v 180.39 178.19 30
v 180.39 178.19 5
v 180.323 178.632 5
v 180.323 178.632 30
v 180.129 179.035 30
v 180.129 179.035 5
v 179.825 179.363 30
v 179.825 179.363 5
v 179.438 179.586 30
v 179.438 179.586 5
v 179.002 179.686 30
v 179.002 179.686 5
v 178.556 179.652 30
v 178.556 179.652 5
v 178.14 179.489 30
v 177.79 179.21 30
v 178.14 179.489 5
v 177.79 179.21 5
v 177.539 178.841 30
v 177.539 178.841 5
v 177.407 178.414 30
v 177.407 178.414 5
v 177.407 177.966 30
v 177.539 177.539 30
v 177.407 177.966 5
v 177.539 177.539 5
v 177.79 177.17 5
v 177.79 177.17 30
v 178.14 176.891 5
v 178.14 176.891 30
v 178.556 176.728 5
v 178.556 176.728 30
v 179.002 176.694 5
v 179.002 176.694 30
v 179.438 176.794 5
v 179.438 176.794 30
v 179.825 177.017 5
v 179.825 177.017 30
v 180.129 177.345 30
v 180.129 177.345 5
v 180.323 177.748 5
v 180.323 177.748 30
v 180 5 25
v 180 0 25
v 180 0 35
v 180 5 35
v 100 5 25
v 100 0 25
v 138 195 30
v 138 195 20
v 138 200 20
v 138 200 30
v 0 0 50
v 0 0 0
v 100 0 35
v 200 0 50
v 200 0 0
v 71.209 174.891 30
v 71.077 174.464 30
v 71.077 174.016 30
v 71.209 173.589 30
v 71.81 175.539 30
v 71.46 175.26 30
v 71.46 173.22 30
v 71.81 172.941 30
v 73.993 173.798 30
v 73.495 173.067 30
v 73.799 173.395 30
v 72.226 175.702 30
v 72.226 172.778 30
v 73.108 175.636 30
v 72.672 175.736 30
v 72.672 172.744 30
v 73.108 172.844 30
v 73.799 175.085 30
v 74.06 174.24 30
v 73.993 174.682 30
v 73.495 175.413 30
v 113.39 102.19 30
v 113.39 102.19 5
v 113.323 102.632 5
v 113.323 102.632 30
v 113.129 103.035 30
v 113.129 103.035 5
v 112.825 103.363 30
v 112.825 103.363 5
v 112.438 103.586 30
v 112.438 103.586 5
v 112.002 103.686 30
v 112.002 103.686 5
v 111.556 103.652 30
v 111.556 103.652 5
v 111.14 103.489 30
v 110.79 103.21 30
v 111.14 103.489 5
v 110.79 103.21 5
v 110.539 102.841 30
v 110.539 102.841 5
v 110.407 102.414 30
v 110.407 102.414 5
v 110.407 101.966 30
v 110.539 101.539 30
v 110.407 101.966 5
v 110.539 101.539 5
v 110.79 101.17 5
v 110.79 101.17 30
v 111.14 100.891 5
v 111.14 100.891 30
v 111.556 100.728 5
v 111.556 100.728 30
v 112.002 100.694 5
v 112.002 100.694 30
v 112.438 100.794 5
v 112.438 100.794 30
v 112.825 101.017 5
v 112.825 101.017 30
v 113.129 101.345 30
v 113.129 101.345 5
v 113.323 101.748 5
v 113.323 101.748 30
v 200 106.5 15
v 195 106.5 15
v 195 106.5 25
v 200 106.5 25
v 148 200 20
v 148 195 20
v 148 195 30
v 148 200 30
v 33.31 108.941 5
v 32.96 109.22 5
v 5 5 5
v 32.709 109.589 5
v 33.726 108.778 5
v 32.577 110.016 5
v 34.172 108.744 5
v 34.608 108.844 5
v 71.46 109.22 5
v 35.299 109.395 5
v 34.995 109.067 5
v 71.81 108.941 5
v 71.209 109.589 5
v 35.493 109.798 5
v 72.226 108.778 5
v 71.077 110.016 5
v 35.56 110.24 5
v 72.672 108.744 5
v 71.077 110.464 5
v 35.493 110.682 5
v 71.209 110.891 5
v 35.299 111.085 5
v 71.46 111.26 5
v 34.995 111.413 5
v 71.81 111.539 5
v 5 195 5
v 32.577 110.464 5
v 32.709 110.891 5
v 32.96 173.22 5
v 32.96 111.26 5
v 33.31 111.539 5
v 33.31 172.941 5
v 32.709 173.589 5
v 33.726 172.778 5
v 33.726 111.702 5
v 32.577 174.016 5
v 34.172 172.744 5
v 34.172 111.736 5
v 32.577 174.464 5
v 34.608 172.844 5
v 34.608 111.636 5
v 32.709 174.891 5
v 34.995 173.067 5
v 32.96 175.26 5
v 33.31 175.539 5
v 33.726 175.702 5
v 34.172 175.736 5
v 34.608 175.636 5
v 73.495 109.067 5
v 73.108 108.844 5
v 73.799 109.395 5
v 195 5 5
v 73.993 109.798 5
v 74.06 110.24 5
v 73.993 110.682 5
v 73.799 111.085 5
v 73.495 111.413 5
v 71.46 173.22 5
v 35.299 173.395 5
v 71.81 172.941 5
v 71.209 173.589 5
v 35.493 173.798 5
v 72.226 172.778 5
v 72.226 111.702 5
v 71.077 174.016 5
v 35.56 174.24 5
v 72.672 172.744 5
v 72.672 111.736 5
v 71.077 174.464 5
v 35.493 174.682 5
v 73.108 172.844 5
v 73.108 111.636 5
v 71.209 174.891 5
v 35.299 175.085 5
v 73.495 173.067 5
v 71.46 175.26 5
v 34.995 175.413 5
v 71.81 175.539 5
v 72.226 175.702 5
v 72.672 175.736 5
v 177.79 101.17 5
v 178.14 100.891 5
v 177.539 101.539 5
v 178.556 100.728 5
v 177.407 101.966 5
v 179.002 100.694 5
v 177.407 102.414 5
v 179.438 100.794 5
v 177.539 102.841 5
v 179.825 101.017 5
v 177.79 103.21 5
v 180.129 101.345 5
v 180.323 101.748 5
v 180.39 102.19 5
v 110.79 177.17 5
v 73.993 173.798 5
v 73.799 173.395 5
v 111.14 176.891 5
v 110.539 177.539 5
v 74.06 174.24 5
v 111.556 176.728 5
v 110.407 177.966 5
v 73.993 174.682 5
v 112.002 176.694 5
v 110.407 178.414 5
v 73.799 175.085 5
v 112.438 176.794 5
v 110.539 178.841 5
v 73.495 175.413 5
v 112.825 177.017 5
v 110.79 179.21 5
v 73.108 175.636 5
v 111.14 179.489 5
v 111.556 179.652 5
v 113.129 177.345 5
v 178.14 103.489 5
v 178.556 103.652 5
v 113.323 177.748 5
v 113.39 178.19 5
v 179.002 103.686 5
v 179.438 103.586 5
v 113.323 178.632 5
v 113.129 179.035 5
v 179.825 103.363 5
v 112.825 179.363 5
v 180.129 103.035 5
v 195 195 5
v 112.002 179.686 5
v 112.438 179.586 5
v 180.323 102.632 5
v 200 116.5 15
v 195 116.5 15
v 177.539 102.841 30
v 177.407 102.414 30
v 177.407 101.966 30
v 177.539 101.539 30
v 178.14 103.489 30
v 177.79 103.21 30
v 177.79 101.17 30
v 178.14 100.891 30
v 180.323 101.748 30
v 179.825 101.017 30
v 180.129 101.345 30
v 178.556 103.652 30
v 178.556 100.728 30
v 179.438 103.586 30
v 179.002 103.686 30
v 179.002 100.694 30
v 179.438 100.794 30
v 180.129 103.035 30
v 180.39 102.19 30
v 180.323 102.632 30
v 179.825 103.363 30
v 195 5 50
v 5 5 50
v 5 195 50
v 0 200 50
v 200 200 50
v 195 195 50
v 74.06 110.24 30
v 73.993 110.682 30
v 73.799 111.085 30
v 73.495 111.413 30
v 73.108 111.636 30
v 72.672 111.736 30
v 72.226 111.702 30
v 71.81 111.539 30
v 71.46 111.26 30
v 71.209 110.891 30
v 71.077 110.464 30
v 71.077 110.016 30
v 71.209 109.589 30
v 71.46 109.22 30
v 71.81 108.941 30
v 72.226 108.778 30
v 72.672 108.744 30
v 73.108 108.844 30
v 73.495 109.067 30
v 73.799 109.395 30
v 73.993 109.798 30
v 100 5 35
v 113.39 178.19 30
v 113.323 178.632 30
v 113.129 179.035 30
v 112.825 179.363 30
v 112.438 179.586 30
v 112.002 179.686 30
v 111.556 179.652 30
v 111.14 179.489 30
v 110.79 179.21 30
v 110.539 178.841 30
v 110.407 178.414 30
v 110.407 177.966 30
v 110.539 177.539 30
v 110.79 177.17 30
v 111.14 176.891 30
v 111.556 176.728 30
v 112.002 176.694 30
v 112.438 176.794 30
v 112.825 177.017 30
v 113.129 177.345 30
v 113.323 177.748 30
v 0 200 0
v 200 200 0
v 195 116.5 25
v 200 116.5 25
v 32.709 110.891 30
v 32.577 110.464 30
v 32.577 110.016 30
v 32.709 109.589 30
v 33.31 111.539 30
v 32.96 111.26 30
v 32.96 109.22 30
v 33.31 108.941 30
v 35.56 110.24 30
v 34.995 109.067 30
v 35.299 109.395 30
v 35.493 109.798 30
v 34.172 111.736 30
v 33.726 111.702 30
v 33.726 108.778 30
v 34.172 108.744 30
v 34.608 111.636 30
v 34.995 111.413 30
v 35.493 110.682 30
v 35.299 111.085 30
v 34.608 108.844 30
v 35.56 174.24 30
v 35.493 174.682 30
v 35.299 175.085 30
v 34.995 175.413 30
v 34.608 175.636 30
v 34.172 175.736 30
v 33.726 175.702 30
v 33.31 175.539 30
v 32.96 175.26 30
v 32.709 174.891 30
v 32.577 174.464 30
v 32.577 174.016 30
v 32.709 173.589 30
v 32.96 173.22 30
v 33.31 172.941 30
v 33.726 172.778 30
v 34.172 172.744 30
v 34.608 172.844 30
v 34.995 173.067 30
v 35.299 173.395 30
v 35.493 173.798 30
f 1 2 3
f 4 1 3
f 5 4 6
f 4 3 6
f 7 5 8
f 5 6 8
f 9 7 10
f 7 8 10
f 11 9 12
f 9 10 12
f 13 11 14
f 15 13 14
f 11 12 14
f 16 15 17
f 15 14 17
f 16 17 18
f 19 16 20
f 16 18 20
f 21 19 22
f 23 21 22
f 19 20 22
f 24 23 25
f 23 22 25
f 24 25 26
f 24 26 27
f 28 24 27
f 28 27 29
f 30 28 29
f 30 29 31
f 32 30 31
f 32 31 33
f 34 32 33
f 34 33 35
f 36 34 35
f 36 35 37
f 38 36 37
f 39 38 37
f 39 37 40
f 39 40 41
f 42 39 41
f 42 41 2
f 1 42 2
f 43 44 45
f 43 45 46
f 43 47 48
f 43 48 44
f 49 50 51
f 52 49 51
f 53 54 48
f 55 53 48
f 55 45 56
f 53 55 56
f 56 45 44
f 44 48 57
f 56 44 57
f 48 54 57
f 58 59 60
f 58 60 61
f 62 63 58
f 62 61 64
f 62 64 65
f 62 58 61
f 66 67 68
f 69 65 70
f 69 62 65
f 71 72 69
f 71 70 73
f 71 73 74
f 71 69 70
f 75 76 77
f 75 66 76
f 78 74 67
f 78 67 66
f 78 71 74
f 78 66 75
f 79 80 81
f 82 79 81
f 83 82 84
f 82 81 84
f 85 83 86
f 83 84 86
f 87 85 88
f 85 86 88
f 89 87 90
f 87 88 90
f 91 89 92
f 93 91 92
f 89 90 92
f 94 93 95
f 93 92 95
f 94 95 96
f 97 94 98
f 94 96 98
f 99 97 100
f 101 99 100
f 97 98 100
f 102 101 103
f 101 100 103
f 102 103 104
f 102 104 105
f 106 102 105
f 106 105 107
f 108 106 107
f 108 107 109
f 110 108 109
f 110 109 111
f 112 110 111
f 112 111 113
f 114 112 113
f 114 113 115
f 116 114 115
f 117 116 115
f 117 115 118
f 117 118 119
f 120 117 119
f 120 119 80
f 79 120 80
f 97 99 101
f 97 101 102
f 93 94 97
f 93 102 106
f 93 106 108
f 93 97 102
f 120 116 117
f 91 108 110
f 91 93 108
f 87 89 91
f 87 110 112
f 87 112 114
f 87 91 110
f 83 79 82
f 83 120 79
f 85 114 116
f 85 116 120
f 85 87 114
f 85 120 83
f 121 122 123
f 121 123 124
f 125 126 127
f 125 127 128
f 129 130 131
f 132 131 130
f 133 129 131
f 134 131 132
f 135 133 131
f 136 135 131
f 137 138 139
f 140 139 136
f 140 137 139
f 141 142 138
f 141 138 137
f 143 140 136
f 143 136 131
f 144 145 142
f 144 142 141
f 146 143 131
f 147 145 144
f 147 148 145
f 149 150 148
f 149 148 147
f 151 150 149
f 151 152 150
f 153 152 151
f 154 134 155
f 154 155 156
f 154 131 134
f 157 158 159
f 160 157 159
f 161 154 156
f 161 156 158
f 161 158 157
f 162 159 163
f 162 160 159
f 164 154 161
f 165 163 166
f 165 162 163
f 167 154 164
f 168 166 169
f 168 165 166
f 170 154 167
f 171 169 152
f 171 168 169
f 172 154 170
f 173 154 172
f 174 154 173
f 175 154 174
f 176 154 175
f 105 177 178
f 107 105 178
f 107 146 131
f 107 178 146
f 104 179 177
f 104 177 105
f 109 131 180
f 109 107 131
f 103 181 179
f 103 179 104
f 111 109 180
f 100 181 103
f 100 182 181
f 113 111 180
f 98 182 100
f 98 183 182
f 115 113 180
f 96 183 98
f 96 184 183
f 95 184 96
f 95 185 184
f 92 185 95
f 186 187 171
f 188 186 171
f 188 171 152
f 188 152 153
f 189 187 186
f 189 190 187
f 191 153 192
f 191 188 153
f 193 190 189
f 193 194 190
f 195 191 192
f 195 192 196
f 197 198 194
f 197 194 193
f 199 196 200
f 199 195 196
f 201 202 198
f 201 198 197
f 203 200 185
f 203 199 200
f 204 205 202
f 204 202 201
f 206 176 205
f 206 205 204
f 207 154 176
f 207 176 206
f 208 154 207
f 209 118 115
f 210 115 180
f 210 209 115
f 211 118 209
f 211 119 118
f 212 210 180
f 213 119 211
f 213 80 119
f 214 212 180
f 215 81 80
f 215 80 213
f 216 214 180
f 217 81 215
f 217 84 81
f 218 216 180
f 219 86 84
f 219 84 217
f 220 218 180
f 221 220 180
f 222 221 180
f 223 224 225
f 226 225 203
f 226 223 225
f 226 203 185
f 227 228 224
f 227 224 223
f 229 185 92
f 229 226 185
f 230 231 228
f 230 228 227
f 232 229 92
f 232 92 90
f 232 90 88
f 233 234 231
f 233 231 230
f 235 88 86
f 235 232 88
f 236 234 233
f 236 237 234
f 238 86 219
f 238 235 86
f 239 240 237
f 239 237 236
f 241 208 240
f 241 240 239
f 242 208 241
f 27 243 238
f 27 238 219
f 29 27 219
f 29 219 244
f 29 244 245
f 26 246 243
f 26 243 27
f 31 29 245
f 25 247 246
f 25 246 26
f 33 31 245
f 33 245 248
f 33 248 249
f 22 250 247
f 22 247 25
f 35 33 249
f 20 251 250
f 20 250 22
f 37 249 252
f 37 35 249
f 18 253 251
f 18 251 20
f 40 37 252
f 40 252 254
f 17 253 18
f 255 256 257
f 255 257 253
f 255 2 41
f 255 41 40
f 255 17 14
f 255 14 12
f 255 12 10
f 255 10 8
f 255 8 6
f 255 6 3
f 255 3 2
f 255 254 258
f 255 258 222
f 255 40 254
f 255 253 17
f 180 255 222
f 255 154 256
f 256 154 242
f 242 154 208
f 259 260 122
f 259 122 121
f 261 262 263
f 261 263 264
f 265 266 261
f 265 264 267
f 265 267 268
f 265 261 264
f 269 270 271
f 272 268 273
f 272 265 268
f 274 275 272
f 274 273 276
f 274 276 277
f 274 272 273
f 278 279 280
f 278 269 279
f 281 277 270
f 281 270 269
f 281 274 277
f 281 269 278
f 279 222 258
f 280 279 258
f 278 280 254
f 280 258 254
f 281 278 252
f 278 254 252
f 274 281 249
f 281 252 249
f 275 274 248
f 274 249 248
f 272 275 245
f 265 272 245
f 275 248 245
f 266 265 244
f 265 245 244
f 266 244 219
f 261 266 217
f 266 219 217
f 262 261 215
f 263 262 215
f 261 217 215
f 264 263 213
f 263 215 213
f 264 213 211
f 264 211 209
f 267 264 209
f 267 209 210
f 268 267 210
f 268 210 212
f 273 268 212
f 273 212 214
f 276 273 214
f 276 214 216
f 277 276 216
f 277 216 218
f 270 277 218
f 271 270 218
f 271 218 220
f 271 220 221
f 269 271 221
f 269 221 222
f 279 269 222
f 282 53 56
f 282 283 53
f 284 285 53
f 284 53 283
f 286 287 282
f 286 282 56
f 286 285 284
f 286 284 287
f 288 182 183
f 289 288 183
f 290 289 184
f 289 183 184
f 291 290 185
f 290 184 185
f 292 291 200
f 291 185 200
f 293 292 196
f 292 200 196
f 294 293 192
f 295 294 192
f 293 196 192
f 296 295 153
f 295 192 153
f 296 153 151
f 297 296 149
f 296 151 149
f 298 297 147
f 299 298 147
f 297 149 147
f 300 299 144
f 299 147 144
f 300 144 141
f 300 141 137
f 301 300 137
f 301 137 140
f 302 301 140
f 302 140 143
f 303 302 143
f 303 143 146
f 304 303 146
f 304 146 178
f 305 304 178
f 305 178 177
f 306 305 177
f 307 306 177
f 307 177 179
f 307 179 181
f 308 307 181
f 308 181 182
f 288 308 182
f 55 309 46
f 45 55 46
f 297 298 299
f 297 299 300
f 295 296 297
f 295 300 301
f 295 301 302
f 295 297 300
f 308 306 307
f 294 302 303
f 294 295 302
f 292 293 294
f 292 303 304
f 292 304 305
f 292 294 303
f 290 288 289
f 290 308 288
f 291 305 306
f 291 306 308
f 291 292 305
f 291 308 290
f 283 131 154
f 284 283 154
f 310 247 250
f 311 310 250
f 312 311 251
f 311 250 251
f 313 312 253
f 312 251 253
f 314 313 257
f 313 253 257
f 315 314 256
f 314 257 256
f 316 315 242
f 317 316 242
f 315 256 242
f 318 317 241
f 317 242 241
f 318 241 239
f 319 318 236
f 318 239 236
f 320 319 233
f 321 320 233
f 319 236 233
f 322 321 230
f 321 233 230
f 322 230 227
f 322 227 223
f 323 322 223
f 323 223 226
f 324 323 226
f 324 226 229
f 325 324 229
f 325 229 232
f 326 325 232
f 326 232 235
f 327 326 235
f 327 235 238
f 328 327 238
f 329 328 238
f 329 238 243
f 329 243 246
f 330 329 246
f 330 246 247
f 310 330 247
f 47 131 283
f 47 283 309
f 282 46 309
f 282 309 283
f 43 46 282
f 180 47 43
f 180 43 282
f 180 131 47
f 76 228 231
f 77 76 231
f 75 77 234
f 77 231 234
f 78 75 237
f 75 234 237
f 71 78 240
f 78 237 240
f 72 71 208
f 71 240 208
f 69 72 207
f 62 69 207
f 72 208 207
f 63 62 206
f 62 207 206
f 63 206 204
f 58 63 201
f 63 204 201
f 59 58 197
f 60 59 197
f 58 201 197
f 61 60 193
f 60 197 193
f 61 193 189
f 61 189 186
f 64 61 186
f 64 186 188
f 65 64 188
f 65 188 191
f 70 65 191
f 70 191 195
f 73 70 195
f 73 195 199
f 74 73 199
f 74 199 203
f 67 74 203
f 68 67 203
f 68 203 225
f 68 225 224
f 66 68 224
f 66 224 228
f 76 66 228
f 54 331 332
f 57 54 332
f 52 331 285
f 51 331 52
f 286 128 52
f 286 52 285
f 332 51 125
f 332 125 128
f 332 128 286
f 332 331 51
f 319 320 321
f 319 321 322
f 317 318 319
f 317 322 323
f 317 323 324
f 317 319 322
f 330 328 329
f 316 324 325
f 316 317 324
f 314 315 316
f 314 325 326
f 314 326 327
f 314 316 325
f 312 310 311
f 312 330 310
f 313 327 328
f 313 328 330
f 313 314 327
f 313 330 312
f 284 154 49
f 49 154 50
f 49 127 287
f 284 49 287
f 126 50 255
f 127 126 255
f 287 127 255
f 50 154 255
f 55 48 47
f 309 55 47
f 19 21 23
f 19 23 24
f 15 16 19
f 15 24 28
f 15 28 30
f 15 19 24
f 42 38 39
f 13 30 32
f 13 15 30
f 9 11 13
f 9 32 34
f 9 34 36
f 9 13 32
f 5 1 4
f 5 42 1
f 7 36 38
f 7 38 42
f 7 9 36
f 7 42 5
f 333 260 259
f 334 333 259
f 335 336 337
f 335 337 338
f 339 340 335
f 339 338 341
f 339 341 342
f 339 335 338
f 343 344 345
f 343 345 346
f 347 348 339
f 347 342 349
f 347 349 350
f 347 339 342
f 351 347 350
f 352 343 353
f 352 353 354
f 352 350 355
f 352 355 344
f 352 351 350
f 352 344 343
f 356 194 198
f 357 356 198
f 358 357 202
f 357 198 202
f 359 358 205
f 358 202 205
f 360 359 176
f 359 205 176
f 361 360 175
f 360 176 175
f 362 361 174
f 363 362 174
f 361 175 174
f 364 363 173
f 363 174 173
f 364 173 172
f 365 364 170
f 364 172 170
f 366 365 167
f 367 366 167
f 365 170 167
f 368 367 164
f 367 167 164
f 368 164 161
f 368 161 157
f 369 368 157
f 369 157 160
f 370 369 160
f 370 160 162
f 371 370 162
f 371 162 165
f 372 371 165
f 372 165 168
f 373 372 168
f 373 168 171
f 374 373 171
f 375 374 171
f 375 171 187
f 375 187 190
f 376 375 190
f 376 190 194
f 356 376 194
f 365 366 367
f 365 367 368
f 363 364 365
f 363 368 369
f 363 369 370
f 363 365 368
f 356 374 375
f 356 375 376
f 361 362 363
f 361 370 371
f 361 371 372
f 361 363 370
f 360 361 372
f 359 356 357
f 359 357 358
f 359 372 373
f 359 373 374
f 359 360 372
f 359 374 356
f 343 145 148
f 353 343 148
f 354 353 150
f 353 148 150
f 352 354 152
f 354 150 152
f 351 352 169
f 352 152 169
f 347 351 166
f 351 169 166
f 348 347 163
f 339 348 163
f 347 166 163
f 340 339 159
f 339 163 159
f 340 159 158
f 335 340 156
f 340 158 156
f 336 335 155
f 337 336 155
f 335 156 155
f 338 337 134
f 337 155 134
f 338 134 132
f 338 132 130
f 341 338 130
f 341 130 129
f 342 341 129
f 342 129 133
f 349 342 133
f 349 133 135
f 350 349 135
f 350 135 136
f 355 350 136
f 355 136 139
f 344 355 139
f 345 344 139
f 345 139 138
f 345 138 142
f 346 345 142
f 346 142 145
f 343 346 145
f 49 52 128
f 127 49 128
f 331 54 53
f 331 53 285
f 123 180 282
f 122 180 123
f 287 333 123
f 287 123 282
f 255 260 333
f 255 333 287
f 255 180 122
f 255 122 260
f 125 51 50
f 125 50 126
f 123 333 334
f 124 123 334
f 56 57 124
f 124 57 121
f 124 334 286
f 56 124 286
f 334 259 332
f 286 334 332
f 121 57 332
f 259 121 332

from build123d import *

# Parameters (mm, degrees)
CYLINDER007_R     = 1.5
CYLINDER007_DEPTH = 30
CYLINDER006_R     = 1.5
CYLINDER006_DEPTH = 30
CYLINDER005_R     = 1.5
CYLINDER005_DEPTH = 30
CYLINDER004_R     = 1.5
CYLINDER004_DEPTH = 30
CYLINDER003_R     = 1.5
CYLINDER003_DEPTH = 30
CYLINDER002_R     = 1.5
CYLINDER002_DEPTH = 30
CYLINDER001_R     = 1.5
CYLINDER001_DEPTH = 30
CYLINDER_R        = 1.5
CYLINDER_DEPTH    = 30
BOX003_W          = 10
BOX003_H          = 10
BOX003_DEPTH      = 10
BOX004_W          = 80
BOX004_H          = 10
BOX004_DEPTH      = 10
BOX002_W          = 10
BOX002_H          = 10
BOX002_DEPTH      = 10
BOX001_W          = 190
BOX001_H          = 190
BOX001_DEPTH      = 45
BOX_W             = 200
BOX_H             = 200
BOX_DEPTH         = 50


with BuildPart() as cylinder007:
    # Cylinder007 → Cylinder007 (new body)
    with BuildSketch(Plane(origin=(34.06, 110.24, 0), x_dir=(1, 0, 0), z_dir=(0, 0, 1))):
        Circle(CYLINDER007_R)
    extrude(amount=CYLINDER007_DEPTH)


with BuildPart() as cylinder006:
    # Cylinder006 → Cylinder006 (new body)
    with BuildSketch(Plane(origin=(34.06, 174.24, 0), x_dir=(1, 0, 0), z_dir=(0, 0, 1))):
        Circle(CYLINDER006_R)
    extrude(amount=CYLINDER006_DEPTH)


with BuildPart() as cylinder005:
    # Cylinder005 → Cylinder005 (new body)
    with BuildSketch(Plane(origin=(72.56, 174.24, 0), x_dir=(1, 0, 0), z_dir=(0, 0, 1))):
        Circle(CYLINDER005_R)
    extrude(amount=CYLINDER005_DEPTH)


with BuildPart() as cylinder004:
    # Cylinder004 → Cylinder004 (new body)
    with BuildSketch(Plane(origin=(72.56, 110.24, 0), x_dir=(1, 0, 0), z_dir=(0, 0, 1))):
        Circle(CYLINDER004_R)
    extrude(amount=CYLINDER004_DEPTH)


with BuildPart() as cylinder003:
    # Cylinder003 → Cylinder003 (new body)
    with BuildSketch(Plane(origin=(178.89, 102.19, 0), x_dir=(1, 0, 0), z_dir=(0, 0, 1))):
        Circle(CYLINDER003_R)
    extrude(amount=CYLINDER003_DEPTH)


with BuildPart() as cylinder002:
    # Cylinder002 → Cylinder002 (new body)
    with BuildSketch(Plane(origin=(178.89, 178.19, 0), x_dir=(1, 0, 0), z_dir=(0, 0, 1))):
        Circle(CYLINDER002_R)
    extrude(amount=CYLINDER002_DEPTH)


with BuildPart() as cylinder001:
    # Cylinder001 → Cylinder001 (new body)
    with BuildSketch(Plane(origin=(111.89, 178.19, 0), x_dir=(1, 0, 0), z_dir=(0, 0, 1))):
        Circle(CYLINDER001_R)
    extrude(amount=CYLINDER001_DEPTH)


with BuildPart() as cylinder:
    # Cylinder → Cylinder (new body)
    with BuildSketch(Plane(origin=(111.89, 102.19, 0), x_dir=(1, 0, 0), z_dir=(0, 0, 1))):
        Circle(CYLINDER_R)
    extrude(amount=CYLINDER_DEPTH)


with BuildPart() as cube003:
    # Box003 → Box003 (new body)
    with BuildSketch(Plane(origin=(191, 106.5, 15), x_dir=(1, 0, 0), z_dir=(0, 0, 1))):
        with Locations((5, 5)):
            Rectangle(BOX003_W, BOX003_H)
    extrude(amount=BOX003_DEPTH)


with BuildPart() as cube004:
    # Box004 → Box004 (new body)
    with BuildSketch(Plane(origin=(100, -1, 25), x_dir=(1, 0, 0), z_dir=(0, 0, 1))):
        with Locations((40, 5)):
            Rectangle(BOX004_W, BOX004_H)
    extrude(amount=BOX004_DEPTH)


with BuildPart() as fusion:
    # Box002 → Box002 (new body)
    with BuildSketch(Plane(origin=(138, 190.5, 20), x_dir=(1, 0, 0), z_dir=(0, 0, 1))):
        with Locations((5, 5)):
            Rectangle(BOX002_W, BOX002_H)
    extrude(amount=BOX002_DEPTH)

    # Fusion: union Cube003, Cube004
    add(cube003.part)
    add(cube004.part)


with BuildPart() as cube001:
    # Box001 → Box001 (new body)
    with BuildSketch(Plane(origin=(5, 5, 5), x_dir=(1, 0, 0), z_dir=(0, 0, 1))):
        with Locations((95, 95)):
            Rectangle(BOX001_W, BOX001_H)
    extrude(amount=BOX001_DEPTH)


with BuildPart() as box_bottom:
    # Box → Box (new body)
    with BuildSketch(Plane.XY):
        with Locations((100, 100)):
            Rectangle(BOX_W, BOX_H)
    extrude(amount=BOX_DEPTH)

    # Cut: cut Cube001
    add(cube001.part, mode=Mode.SUBTRACT)

    # Cut001: cut Fusion
    add(fusion.part, mode=Mode.SUBTRACT)

    # Fusion001: union Cylinder007, Cylinder006, Cylinder005, Cylinder004, Cylinder003, Cylinder002, Cylinder001, Cylinder
    add(cylinder007.part)
    add(cylinder006.part)
    add(cylinder005.part)
    add(cylinder004.part)
    add(cylinder003.part)
    add(cylinder002.part)
    add(cylinder001.part)
    add(cylinder.part)


solid = box_bottom.part
